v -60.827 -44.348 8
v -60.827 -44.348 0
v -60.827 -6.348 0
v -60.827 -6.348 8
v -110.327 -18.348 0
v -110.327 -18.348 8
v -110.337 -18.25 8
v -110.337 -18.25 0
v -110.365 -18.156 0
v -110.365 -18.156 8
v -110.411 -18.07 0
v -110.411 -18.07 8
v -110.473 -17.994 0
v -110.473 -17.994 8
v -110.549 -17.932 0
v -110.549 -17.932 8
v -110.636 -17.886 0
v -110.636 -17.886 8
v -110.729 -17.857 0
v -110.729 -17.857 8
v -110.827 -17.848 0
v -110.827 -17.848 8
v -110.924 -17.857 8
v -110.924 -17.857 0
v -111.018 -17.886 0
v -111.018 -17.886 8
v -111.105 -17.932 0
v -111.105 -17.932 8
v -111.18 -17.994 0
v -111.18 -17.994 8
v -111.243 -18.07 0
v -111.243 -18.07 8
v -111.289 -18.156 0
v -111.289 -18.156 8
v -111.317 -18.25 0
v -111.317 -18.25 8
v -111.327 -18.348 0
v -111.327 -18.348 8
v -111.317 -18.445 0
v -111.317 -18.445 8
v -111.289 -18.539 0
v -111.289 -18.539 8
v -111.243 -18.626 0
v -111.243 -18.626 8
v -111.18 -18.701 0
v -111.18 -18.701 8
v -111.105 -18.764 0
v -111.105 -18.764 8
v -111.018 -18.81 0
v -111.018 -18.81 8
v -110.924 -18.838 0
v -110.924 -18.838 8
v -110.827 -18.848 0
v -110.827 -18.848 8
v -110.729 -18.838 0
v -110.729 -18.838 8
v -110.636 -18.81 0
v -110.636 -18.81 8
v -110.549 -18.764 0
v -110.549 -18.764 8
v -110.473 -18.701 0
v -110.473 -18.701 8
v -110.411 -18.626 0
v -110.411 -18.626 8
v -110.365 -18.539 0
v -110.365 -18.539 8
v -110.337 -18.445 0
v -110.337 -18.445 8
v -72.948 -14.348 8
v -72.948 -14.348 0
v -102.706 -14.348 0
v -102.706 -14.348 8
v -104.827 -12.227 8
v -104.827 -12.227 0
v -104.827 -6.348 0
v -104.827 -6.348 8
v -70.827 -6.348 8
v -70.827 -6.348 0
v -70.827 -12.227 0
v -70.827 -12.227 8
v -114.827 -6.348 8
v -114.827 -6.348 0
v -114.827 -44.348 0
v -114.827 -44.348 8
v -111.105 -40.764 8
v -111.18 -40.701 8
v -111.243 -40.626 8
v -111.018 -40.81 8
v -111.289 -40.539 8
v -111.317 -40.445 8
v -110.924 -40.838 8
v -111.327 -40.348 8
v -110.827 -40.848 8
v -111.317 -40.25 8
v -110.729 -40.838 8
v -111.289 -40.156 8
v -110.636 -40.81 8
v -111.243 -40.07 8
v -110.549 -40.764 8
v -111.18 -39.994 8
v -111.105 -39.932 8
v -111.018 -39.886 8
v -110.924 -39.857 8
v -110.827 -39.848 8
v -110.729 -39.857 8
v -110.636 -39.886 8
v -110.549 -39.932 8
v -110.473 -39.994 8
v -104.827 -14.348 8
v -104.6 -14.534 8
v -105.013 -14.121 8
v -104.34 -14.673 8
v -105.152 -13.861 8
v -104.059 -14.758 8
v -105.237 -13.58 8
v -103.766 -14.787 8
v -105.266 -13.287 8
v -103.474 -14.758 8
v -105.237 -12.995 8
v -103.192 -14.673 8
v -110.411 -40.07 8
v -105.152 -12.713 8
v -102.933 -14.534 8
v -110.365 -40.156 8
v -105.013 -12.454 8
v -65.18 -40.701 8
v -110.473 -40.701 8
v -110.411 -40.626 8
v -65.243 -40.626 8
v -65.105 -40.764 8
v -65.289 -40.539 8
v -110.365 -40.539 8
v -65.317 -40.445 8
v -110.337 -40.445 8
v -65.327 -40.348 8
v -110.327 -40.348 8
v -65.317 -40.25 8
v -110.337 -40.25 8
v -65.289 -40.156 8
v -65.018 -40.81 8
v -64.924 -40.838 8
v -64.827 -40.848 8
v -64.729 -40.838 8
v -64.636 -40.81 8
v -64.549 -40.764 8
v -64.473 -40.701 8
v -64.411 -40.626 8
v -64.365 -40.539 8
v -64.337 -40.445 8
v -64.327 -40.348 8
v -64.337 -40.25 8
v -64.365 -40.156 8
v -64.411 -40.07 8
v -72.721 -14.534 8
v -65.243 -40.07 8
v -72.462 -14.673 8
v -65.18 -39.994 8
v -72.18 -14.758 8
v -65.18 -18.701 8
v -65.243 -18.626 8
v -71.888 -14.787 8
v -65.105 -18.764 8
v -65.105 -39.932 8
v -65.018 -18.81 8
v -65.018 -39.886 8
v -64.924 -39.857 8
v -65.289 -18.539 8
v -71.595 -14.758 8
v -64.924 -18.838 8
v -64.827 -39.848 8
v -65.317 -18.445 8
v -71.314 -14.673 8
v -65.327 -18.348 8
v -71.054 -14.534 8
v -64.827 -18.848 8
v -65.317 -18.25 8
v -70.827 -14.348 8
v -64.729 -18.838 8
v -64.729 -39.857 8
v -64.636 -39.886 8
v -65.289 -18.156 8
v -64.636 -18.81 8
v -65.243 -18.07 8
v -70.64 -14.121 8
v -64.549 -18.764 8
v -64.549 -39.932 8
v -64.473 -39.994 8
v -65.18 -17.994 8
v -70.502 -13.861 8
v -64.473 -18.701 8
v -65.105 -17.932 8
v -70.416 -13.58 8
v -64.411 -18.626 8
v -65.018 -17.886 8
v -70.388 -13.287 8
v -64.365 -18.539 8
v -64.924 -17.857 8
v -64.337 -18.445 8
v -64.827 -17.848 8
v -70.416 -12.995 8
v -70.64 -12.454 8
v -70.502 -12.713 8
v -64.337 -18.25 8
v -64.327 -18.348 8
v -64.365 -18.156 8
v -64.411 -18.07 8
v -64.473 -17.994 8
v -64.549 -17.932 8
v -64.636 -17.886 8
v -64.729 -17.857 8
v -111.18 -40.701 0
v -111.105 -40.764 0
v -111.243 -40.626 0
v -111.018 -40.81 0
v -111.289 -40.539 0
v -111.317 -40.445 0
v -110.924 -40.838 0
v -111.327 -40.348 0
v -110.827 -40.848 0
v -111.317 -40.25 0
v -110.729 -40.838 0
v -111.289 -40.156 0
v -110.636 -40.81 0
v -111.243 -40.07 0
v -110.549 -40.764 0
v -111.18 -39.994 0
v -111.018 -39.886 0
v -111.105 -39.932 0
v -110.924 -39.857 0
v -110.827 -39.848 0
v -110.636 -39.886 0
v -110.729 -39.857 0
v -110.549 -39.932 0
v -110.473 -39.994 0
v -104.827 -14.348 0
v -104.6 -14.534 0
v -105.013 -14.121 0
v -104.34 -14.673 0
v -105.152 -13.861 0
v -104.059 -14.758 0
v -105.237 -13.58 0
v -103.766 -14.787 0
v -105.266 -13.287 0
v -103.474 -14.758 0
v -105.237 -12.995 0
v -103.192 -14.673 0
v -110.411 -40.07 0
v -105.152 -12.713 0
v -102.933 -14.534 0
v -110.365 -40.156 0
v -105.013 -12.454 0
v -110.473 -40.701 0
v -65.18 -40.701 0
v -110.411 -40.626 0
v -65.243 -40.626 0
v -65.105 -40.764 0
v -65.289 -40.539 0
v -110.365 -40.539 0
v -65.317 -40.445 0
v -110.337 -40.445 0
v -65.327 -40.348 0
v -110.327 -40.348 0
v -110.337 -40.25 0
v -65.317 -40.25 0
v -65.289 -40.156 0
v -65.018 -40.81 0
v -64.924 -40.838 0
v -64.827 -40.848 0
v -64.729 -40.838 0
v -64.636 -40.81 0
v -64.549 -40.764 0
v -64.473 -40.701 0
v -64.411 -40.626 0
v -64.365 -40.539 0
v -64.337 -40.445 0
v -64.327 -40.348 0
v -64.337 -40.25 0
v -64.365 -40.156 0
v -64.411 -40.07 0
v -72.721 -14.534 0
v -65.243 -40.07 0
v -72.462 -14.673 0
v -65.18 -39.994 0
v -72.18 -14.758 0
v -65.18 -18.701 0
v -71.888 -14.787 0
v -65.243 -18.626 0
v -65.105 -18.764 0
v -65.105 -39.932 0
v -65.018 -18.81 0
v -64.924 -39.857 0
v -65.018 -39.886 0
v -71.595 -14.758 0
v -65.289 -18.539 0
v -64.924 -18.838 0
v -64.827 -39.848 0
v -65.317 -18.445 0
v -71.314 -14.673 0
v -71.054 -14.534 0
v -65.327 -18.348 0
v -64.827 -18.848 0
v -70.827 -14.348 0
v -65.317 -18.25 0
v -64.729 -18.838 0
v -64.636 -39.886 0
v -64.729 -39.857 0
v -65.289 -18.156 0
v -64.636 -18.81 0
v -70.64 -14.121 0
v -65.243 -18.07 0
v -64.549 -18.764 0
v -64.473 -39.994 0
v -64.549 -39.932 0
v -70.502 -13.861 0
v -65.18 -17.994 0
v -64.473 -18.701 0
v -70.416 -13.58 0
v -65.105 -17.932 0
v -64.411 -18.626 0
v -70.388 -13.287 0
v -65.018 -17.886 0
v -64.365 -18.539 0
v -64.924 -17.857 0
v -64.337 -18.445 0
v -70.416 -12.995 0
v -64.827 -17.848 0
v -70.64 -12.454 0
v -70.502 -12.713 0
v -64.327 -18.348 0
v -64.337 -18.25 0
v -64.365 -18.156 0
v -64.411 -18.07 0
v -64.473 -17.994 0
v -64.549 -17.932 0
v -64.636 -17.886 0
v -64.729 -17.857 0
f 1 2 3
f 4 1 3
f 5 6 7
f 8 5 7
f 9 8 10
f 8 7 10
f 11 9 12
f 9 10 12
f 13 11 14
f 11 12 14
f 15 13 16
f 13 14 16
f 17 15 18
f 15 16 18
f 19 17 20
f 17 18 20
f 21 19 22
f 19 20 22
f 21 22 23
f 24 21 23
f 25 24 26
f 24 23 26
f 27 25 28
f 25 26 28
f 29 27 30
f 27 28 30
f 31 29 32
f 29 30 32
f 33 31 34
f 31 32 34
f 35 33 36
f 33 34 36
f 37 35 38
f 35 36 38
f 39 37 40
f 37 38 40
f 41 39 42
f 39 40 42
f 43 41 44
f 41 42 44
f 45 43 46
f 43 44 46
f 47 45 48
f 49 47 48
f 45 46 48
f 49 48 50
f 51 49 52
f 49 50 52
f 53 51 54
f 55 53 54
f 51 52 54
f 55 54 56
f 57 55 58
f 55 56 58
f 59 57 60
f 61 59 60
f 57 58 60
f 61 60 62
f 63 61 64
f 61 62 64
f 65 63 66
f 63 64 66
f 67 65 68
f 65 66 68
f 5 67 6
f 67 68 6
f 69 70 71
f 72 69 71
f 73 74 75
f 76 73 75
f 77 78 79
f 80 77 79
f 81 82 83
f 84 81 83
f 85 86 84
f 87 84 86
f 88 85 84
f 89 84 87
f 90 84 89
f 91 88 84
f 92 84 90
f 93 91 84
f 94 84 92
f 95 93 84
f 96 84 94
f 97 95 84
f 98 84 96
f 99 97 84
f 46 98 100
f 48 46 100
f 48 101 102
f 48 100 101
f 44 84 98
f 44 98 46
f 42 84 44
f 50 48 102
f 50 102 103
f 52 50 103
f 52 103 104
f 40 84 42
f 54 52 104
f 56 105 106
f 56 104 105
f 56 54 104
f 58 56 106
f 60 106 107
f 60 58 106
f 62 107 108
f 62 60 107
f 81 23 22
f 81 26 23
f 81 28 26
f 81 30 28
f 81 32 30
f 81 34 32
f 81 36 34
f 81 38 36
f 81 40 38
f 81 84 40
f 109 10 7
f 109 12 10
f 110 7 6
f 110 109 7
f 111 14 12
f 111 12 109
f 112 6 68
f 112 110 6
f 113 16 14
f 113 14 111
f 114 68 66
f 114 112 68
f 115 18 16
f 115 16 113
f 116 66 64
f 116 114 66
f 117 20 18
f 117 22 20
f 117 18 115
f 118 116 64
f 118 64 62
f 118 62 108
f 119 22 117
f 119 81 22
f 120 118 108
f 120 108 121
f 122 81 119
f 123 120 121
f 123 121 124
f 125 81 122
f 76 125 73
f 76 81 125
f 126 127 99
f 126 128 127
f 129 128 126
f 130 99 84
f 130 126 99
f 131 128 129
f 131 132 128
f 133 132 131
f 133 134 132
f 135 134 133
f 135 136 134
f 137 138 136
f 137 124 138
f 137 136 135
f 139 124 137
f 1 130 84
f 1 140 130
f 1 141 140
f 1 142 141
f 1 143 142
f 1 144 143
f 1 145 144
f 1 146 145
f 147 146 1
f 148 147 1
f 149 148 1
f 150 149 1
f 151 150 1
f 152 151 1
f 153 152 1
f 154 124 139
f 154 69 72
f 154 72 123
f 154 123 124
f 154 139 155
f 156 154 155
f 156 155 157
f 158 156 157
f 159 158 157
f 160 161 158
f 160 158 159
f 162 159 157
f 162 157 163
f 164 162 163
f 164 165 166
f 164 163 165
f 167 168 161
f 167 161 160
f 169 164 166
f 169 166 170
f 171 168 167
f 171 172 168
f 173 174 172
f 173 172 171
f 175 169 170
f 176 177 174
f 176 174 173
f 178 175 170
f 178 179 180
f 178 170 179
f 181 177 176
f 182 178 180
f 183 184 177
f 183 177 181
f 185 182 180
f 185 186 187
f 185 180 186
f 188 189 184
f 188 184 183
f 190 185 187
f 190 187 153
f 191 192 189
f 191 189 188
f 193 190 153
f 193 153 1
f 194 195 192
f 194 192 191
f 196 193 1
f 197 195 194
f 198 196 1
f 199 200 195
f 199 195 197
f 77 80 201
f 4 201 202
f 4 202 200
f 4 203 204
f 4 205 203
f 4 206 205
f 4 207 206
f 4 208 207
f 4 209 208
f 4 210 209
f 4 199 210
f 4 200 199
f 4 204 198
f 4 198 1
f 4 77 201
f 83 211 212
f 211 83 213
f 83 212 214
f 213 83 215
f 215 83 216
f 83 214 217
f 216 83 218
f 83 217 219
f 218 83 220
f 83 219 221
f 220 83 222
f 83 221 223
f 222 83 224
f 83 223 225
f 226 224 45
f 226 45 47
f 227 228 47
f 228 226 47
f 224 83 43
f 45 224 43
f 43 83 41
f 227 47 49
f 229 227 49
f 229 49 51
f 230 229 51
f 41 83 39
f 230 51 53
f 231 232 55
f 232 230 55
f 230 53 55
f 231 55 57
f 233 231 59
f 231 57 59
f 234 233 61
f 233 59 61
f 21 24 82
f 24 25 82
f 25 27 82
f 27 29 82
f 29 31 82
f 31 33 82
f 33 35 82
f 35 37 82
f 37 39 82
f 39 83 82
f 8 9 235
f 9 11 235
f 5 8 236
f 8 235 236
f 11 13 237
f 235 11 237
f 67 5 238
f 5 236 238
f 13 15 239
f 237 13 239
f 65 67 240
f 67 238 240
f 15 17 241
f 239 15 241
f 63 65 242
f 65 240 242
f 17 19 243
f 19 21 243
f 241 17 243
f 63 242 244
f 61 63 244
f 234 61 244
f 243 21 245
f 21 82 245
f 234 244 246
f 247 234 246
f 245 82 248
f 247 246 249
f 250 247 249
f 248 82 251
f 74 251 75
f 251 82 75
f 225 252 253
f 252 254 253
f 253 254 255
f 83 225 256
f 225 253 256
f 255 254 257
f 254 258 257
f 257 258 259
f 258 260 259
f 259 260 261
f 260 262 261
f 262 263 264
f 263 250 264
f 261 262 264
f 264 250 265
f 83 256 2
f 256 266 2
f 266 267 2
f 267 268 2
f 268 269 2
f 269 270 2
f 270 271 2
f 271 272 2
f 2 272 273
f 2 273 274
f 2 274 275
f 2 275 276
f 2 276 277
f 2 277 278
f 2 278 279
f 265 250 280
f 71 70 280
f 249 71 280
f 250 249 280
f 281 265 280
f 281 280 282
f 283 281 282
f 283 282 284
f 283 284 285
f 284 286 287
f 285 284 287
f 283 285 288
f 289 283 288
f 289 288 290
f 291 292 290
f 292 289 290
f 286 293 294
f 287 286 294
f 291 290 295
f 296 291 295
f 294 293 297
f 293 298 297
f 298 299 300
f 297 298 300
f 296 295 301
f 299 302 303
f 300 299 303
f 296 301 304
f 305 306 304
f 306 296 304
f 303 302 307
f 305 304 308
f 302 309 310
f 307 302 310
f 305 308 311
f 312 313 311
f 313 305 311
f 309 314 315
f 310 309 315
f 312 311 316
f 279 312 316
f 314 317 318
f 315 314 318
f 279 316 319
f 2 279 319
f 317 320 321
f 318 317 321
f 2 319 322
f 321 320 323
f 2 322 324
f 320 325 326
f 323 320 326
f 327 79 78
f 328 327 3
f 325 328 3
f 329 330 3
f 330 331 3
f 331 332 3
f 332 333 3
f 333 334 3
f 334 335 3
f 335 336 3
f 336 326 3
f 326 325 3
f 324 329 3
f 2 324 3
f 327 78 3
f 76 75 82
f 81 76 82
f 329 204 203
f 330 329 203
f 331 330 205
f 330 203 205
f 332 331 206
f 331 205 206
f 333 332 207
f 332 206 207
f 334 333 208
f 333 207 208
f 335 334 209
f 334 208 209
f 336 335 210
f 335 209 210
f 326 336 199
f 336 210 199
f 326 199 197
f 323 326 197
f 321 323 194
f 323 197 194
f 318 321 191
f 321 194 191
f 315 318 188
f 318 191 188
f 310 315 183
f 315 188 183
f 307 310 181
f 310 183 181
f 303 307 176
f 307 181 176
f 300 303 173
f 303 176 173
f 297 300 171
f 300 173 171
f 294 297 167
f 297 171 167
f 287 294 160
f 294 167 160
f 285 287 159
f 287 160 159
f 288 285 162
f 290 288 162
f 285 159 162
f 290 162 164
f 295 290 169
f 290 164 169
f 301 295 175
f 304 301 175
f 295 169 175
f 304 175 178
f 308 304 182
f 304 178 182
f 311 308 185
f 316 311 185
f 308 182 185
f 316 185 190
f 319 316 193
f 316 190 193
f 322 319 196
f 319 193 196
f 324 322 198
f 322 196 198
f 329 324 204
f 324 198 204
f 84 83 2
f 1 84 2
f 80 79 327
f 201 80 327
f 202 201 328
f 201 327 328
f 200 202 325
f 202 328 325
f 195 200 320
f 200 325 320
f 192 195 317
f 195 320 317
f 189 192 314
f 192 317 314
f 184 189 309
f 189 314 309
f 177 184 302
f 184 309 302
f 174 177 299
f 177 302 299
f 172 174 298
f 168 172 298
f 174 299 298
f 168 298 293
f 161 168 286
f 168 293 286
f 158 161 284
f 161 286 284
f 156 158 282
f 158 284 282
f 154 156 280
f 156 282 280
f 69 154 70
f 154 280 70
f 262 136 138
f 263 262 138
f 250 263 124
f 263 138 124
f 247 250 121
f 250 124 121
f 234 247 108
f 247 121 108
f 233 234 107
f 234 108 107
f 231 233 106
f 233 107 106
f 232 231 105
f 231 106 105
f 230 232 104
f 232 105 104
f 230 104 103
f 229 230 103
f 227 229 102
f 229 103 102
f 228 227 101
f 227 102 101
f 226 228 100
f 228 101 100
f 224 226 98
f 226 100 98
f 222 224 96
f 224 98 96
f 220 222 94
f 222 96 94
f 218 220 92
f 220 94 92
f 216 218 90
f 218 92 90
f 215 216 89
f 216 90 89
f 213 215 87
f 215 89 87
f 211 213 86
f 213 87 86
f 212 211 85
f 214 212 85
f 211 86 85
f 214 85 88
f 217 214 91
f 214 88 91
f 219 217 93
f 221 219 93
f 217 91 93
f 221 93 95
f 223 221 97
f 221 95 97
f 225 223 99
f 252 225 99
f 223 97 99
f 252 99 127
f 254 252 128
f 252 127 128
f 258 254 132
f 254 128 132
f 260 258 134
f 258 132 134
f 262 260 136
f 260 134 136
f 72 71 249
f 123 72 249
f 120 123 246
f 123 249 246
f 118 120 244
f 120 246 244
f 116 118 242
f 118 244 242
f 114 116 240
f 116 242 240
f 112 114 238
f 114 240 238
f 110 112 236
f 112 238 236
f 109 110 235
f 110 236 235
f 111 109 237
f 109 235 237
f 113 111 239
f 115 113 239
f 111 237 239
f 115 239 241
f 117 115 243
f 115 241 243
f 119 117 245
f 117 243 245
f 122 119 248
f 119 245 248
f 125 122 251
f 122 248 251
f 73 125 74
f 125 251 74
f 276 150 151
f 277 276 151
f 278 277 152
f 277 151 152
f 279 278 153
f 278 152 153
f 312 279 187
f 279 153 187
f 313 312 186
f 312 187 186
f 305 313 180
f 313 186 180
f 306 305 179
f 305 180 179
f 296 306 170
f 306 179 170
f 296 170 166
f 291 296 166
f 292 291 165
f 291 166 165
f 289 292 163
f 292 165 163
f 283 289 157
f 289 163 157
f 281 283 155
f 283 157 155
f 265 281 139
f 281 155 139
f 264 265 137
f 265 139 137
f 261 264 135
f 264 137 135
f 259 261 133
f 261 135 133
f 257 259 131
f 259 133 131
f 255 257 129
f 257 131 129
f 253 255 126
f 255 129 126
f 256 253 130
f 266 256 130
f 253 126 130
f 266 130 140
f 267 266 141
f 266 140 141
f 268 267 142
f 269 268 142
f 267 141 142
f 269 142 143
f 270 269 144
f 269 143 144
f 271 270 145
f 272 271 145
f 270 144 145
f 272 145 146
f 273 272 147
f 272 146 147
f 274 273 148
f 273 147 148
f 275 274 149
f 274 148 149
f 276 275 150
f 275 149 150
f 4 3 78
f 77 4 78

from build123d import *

# Parameters (mm, degrees)
BOSS_EXTRU_1_DEPTH      = 8
ESQUISSE2_R             = 0.5
ENL_V_MAT_EXTRU_1_DEPTH = 8


with BuildPart() as part:
    # Esquisse1 → Boss.-Extru.1 (new body)
    with BuildSketch(Plane.XY):
        with BuildLine():
            Line((-114.826935211, -6.347820711), (-114.826935211, -44.347820711))
            Line((-114.826935211, -44.347820711), (-60.826935211, -44.347820711))
            Line((-60.826935211, -44.347820711), (-60.826935211, -6.347820711))
            Line((-60.826935211, -6.347820711), (-70.826935211, -6.347820711))
            Line((-70.826935211, -6.347820711), (-70.826935211, -12.226500367))
            ThreePointArc((-70.826935211, -12.226500367), (-70.826935211, -14.347820711), (-72.948255555, -14.347820711))
            Line((-72.948255555, -14.347820711), (-102.705614868, -14.347820711))
            ThreePointArc((-102.705614868, -14.347820711), (-104.826935211, -14.347820711), (-104.826935211, -12.226500367))
            Line((-104.826935211, -12.226500367), (-104.826935211, -6.347820711))
            Line((-104.826935211, -6.347820711), (-114.826935211, -6.347820711))
        make_face()
    extrude(amount=BOSS_EXTRU_1_DEPTH)

    # Esquisse2 → Enlèv. mat.-Extru.1 (cut)
    with BuildSketch(Plane.XY.offset(8)):
        with Locations((-110.826935211, -18.347820711)):
            Circle(ESQUISSE2_R)
        with Locations((-64.826935211, -18.347820711)):
            Circle(ESQUISSE2_R)
        with Locations((-64.826935211, -40.347820711)):
            Circle(ESQUISSE2_R)
        with Locations((-110.826935211, -40.347820711)):
            Circle(ESQUISSE2_R)
    extrude(amount=-ENL_V_MAT_EXTRU_1_DEPTH, mode=Mode.SUBTRACT)


solid = part.part
